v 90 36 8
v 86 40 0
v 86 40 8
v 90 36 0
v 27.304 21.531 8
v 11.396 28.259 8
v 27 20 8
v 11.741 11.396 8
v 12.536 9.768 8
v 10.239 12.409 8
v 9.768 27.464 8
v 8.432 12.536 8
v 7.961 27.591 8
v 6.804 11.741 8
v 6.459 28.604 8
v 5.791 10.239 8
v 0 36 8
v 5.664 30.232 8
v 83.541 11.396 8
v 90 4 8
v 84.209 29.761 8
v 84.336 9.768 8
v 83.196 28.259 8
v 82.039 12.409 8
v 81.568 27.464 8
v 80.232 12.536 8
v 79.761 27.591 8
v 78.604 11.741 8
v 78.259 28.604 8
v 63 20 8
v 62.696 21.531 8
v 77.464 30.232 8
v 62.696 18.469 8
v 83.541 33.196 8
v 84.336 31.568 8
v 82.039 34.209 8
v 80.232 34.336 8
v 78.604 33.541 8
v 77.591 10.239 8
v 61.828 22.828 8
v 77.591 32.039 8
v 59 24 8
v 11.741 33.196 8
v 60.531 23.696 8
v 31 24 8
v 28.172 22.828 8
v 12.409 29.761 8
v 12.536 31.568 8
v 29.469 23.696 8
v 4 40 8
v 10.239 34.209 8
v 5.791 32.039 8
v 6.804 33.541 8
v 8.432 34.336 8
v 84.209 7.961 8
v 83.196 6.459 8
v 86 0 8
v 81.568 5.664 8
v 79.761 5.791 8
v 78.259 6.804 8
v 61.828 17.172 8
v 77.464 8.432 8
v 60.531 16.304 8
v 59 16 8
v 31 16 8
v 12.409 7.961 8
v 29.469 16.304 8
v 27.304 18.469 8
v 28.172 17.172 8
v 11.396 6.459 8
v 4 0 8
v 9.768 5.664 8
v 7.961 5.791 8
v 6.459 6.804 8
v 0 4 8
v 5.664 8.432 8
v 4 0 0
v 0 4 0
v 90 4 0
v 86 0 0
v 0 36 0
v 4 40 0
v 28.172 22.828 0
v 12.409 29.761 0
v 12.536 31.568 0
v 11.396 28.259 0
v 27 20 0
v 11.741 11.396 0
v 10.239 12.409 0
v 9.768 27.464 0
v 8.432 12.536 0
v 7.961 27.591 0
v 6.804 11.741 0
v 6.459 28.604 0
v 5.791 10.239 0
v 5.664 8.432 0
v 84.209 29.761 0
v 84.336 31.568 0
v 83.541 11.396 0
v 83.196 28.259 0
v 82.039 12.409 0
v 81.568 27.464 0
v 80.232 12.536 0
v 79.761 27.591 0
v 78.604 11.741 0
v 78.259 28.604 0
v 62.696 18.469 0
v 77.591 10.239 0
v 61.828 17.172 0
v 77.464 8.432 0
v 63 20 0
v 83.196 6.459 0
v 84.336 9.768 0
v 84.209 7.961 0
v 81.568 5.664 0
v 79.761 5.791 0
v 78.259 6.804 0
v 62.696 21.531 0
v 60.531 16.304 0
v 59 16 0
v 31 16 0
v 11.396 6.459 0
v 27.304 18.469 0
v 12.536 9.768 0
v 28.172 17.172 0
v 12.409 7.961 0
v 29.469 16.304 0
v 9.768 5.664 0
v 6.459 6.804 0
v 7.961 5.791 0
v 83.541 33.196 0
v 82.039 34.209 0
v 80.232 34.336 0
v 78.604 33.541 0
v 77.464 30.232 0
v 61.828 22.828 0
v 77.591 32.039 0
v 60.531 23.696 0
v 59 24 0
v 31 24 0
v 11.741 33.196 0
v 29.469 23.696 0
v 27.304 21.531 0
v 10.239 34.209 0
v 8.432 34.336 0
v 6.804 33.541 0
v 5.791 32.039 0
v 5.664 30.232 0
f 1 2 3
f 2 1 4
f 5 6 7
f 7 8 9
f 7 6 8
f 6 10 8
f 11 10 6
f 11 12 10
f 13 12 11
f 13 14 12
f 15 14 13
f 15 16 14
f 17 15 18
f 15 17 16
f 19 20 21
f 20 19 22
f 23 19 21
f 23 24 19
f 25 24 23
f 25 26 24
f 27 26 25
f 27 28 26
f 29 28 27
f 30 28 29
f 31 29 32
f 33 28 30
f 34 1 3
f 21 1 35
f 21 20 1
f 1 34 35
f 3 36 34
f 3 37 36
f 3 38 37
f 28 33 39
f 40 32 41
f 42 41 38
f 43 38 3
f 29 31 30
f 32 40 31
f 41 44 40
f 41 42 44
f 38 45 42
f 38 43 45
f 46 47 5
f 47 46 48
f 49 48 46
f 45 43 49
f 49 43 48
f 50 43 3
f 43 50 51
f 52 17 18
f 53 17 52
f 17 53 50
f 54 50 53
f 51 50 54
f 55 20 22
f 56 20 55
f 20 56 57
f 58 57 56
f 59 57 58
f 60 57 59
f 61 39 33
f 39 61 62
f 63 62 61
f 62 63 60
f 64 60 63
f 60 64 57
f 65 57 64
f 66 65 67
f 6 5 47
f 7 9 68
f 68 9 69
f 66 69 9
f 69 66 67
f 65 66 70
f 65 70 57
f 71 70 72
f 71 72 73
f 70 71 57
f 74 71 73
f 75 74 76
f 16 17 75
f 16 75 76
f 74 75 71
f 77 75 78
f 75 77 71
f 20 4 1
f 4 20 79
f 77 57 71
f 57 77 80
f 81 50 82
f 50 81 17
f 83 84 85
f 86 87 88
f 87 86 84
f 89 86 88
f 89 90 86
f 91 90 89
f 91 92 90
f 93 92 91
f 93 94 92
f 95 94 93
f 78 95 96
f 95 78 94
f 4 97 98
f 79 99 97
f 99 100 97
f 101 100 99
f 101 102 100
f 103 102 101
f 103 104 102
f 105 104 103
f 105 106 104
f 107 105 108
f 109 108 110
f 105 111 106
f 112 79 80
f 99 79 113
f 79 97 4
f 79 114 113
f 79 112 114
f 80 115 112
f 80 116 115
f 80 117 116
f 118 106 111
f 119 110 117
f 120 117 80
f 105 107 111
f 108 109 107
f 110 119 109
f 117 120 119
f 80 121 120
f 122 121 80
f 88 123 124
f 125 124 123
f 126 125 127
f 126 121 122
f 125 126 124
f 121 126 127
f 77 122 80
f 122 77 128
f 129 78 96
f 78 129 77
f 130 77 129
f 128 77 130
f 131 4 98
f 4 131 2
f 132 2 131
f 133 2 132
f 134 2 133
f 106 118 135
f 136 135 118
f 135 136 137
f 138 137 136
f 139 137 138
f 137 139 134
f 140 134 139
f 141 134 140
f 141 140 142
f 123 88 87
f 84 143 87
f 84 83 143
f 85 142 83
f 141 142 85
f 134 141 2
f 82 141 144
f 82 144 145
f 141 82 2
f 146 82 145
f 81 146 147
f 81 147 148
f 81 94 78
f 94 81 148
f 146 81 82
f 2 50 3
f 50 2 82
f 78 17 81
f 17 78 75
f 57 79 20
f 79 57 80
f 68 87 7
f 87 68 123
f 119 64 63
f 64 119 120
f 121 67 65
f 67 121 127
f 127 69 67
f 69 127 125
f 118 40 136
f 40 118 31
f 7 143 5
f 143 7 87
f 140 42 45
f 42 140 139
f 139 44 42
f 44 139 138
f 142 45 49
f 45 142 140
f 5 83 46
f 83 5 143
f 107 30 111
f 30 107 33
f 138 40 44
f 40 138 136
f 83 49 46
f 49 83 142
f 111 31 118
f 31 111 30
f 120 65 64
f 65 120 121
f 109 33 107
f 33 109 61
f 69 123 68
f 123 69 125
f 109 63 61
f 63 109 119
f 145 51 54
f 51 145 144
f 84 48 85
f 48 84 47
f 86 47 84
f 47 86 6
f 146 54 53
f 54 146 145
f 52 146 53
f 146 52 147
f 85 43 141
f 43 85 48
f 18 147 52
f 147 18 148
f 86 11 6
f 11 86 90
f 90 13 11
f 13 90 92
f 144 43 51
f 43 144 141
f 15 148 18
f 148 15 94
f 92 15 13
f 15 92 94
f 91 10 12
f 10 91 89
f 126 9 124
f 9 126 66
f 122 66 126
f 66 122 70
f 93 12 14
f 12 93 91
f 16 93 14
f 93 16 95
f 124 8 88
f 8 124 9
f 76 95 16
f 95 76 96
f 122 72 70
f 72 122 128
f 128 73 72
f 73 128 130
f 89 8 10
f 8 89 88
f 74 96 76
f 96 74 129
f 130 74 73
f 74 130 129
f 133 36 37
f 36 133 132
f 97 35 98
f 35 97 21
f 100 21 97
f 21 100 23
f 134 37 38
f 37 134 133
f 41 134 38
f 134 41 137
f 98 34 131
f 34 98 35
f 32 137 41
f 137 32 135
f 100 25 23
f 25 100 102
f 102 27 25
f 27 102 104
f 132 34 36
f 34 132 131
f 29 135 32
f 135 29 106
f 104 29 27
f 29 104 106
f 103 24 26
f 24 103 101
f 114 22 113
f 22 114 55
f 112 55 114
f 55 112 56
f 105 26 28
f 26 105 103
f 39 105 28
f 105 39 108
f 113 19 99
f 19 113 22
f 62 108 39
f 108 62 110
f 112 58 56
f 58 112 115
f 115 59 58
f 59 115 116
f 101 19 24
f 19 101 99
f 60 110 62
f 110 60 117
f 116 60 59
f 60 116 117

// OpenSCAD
$fn = 32;

// ----------------------------------------------------------------------
// Bracket plate: slot plate 90 x 40
// ----------------------------------------------------------------------

// --- parameters (mm) ---
hole_r = 3.5;             // bolt hole radius
plate_t = 8;              // plate thickness, Z (extrusion height)
plate_l = 90;             // plate length
plate_w = 40;             // plate width
slot_l = 28;              // slot straight length
slot_r = 4;               // slot end radius

slot_len = slot_l + 2 * slot_r;
slot_w = 2 * slot_r;
hole_d2 = 2 * hole_r;

profile = [[4, 0], [86, 0], [90, 4], [90, 36], [86, 40], [4, 40], [0, 36], [0, 4]];  // primary outline, 8 points, counter clockwise
void_1 = [[59, 16], [60.531, 16.304], [61.828, 17.172], [62.696, 18.469], [63, 20], [62.696, 21.531], [61.828, 22.828], [60.531, 23.696], [59, 24], [31, 24], [29.469, 23.696], [28.172, 22.828], [27.304, 21.531], [27, 20], [27.304, 18.469], [28.172, 17.172], [29.469, 16.304], [31, 16]];  // grip slot, 18 points
void_2 = [[12.536, 31.568], [11.741, 33.196], [10.239, 34.209], [8.432, 34.336], [6.804, 33.541], [5.791, 32.039], [5.664, 30.232], [6.459, 28.604], [7.961, 27.591], [9.768, 27.464], [11.396, 28.259], [12.409, 29.761]];  // corner hole, 12 points
void_3 = [[12.536, 9.768], [11.741, 11.396], [10.239, 12.409], [8.432, 12.536], [6.804, 11.741], [5.791, 10.239], [5.664, 8.432], [6.459, 6.804], [7.961, 5.791], [9.768, 5.664], [11.396, 6.459], [12.409, 7.961]];  // corner hole, 12 points
void_4 = [[84.336, 31.568], [83.541, 33.196], [82.039, 34.209], [80.232, 34.336], [78.604, 33.541], [77.591, 32.039], [77.464, 30.232], [78.259, 28.604], [79.761, 27.591], [81.568, 27.464], [83.196, 28.259], [84.209, 29.761]];  // corner hole, 12 points
void_5 = [[84.336, 9.768], [83.541, 11.396], [82.039, 12.409], [80.232, 12.536], [78.604, 11.741], [77.591, 10.239], [77.464, 8.432], [78.259, 6.804], [79.761, 5.791], [81.568, 5.664], [83.196, 6.459], [84.209, 7.961]];  // corner hole, 12 points

// --- the one profile operation ---
difference() {
  linear_extrude(height = plate_t) polygon(points = profile);
  translate([0, 0, -1])
    linear_extrude(height = plate_t + 2) polygon(points = void_1);
  translate([0, 0, -1])
    linear_extrude(height = plate_t + 2) polygon(points = void_2);
  translate([0, 0, -1])
    linear_extrude(height = plate_t + 2) polygon(points = void_3);
  translate([0, 0, -1])
    linear_extrude(height = plate_t + 2) polygon(points = void_4);
  translate([0, 0, -1])
    linear_extrude(height = plate_t + 2) polygon(points = void_5);
}
